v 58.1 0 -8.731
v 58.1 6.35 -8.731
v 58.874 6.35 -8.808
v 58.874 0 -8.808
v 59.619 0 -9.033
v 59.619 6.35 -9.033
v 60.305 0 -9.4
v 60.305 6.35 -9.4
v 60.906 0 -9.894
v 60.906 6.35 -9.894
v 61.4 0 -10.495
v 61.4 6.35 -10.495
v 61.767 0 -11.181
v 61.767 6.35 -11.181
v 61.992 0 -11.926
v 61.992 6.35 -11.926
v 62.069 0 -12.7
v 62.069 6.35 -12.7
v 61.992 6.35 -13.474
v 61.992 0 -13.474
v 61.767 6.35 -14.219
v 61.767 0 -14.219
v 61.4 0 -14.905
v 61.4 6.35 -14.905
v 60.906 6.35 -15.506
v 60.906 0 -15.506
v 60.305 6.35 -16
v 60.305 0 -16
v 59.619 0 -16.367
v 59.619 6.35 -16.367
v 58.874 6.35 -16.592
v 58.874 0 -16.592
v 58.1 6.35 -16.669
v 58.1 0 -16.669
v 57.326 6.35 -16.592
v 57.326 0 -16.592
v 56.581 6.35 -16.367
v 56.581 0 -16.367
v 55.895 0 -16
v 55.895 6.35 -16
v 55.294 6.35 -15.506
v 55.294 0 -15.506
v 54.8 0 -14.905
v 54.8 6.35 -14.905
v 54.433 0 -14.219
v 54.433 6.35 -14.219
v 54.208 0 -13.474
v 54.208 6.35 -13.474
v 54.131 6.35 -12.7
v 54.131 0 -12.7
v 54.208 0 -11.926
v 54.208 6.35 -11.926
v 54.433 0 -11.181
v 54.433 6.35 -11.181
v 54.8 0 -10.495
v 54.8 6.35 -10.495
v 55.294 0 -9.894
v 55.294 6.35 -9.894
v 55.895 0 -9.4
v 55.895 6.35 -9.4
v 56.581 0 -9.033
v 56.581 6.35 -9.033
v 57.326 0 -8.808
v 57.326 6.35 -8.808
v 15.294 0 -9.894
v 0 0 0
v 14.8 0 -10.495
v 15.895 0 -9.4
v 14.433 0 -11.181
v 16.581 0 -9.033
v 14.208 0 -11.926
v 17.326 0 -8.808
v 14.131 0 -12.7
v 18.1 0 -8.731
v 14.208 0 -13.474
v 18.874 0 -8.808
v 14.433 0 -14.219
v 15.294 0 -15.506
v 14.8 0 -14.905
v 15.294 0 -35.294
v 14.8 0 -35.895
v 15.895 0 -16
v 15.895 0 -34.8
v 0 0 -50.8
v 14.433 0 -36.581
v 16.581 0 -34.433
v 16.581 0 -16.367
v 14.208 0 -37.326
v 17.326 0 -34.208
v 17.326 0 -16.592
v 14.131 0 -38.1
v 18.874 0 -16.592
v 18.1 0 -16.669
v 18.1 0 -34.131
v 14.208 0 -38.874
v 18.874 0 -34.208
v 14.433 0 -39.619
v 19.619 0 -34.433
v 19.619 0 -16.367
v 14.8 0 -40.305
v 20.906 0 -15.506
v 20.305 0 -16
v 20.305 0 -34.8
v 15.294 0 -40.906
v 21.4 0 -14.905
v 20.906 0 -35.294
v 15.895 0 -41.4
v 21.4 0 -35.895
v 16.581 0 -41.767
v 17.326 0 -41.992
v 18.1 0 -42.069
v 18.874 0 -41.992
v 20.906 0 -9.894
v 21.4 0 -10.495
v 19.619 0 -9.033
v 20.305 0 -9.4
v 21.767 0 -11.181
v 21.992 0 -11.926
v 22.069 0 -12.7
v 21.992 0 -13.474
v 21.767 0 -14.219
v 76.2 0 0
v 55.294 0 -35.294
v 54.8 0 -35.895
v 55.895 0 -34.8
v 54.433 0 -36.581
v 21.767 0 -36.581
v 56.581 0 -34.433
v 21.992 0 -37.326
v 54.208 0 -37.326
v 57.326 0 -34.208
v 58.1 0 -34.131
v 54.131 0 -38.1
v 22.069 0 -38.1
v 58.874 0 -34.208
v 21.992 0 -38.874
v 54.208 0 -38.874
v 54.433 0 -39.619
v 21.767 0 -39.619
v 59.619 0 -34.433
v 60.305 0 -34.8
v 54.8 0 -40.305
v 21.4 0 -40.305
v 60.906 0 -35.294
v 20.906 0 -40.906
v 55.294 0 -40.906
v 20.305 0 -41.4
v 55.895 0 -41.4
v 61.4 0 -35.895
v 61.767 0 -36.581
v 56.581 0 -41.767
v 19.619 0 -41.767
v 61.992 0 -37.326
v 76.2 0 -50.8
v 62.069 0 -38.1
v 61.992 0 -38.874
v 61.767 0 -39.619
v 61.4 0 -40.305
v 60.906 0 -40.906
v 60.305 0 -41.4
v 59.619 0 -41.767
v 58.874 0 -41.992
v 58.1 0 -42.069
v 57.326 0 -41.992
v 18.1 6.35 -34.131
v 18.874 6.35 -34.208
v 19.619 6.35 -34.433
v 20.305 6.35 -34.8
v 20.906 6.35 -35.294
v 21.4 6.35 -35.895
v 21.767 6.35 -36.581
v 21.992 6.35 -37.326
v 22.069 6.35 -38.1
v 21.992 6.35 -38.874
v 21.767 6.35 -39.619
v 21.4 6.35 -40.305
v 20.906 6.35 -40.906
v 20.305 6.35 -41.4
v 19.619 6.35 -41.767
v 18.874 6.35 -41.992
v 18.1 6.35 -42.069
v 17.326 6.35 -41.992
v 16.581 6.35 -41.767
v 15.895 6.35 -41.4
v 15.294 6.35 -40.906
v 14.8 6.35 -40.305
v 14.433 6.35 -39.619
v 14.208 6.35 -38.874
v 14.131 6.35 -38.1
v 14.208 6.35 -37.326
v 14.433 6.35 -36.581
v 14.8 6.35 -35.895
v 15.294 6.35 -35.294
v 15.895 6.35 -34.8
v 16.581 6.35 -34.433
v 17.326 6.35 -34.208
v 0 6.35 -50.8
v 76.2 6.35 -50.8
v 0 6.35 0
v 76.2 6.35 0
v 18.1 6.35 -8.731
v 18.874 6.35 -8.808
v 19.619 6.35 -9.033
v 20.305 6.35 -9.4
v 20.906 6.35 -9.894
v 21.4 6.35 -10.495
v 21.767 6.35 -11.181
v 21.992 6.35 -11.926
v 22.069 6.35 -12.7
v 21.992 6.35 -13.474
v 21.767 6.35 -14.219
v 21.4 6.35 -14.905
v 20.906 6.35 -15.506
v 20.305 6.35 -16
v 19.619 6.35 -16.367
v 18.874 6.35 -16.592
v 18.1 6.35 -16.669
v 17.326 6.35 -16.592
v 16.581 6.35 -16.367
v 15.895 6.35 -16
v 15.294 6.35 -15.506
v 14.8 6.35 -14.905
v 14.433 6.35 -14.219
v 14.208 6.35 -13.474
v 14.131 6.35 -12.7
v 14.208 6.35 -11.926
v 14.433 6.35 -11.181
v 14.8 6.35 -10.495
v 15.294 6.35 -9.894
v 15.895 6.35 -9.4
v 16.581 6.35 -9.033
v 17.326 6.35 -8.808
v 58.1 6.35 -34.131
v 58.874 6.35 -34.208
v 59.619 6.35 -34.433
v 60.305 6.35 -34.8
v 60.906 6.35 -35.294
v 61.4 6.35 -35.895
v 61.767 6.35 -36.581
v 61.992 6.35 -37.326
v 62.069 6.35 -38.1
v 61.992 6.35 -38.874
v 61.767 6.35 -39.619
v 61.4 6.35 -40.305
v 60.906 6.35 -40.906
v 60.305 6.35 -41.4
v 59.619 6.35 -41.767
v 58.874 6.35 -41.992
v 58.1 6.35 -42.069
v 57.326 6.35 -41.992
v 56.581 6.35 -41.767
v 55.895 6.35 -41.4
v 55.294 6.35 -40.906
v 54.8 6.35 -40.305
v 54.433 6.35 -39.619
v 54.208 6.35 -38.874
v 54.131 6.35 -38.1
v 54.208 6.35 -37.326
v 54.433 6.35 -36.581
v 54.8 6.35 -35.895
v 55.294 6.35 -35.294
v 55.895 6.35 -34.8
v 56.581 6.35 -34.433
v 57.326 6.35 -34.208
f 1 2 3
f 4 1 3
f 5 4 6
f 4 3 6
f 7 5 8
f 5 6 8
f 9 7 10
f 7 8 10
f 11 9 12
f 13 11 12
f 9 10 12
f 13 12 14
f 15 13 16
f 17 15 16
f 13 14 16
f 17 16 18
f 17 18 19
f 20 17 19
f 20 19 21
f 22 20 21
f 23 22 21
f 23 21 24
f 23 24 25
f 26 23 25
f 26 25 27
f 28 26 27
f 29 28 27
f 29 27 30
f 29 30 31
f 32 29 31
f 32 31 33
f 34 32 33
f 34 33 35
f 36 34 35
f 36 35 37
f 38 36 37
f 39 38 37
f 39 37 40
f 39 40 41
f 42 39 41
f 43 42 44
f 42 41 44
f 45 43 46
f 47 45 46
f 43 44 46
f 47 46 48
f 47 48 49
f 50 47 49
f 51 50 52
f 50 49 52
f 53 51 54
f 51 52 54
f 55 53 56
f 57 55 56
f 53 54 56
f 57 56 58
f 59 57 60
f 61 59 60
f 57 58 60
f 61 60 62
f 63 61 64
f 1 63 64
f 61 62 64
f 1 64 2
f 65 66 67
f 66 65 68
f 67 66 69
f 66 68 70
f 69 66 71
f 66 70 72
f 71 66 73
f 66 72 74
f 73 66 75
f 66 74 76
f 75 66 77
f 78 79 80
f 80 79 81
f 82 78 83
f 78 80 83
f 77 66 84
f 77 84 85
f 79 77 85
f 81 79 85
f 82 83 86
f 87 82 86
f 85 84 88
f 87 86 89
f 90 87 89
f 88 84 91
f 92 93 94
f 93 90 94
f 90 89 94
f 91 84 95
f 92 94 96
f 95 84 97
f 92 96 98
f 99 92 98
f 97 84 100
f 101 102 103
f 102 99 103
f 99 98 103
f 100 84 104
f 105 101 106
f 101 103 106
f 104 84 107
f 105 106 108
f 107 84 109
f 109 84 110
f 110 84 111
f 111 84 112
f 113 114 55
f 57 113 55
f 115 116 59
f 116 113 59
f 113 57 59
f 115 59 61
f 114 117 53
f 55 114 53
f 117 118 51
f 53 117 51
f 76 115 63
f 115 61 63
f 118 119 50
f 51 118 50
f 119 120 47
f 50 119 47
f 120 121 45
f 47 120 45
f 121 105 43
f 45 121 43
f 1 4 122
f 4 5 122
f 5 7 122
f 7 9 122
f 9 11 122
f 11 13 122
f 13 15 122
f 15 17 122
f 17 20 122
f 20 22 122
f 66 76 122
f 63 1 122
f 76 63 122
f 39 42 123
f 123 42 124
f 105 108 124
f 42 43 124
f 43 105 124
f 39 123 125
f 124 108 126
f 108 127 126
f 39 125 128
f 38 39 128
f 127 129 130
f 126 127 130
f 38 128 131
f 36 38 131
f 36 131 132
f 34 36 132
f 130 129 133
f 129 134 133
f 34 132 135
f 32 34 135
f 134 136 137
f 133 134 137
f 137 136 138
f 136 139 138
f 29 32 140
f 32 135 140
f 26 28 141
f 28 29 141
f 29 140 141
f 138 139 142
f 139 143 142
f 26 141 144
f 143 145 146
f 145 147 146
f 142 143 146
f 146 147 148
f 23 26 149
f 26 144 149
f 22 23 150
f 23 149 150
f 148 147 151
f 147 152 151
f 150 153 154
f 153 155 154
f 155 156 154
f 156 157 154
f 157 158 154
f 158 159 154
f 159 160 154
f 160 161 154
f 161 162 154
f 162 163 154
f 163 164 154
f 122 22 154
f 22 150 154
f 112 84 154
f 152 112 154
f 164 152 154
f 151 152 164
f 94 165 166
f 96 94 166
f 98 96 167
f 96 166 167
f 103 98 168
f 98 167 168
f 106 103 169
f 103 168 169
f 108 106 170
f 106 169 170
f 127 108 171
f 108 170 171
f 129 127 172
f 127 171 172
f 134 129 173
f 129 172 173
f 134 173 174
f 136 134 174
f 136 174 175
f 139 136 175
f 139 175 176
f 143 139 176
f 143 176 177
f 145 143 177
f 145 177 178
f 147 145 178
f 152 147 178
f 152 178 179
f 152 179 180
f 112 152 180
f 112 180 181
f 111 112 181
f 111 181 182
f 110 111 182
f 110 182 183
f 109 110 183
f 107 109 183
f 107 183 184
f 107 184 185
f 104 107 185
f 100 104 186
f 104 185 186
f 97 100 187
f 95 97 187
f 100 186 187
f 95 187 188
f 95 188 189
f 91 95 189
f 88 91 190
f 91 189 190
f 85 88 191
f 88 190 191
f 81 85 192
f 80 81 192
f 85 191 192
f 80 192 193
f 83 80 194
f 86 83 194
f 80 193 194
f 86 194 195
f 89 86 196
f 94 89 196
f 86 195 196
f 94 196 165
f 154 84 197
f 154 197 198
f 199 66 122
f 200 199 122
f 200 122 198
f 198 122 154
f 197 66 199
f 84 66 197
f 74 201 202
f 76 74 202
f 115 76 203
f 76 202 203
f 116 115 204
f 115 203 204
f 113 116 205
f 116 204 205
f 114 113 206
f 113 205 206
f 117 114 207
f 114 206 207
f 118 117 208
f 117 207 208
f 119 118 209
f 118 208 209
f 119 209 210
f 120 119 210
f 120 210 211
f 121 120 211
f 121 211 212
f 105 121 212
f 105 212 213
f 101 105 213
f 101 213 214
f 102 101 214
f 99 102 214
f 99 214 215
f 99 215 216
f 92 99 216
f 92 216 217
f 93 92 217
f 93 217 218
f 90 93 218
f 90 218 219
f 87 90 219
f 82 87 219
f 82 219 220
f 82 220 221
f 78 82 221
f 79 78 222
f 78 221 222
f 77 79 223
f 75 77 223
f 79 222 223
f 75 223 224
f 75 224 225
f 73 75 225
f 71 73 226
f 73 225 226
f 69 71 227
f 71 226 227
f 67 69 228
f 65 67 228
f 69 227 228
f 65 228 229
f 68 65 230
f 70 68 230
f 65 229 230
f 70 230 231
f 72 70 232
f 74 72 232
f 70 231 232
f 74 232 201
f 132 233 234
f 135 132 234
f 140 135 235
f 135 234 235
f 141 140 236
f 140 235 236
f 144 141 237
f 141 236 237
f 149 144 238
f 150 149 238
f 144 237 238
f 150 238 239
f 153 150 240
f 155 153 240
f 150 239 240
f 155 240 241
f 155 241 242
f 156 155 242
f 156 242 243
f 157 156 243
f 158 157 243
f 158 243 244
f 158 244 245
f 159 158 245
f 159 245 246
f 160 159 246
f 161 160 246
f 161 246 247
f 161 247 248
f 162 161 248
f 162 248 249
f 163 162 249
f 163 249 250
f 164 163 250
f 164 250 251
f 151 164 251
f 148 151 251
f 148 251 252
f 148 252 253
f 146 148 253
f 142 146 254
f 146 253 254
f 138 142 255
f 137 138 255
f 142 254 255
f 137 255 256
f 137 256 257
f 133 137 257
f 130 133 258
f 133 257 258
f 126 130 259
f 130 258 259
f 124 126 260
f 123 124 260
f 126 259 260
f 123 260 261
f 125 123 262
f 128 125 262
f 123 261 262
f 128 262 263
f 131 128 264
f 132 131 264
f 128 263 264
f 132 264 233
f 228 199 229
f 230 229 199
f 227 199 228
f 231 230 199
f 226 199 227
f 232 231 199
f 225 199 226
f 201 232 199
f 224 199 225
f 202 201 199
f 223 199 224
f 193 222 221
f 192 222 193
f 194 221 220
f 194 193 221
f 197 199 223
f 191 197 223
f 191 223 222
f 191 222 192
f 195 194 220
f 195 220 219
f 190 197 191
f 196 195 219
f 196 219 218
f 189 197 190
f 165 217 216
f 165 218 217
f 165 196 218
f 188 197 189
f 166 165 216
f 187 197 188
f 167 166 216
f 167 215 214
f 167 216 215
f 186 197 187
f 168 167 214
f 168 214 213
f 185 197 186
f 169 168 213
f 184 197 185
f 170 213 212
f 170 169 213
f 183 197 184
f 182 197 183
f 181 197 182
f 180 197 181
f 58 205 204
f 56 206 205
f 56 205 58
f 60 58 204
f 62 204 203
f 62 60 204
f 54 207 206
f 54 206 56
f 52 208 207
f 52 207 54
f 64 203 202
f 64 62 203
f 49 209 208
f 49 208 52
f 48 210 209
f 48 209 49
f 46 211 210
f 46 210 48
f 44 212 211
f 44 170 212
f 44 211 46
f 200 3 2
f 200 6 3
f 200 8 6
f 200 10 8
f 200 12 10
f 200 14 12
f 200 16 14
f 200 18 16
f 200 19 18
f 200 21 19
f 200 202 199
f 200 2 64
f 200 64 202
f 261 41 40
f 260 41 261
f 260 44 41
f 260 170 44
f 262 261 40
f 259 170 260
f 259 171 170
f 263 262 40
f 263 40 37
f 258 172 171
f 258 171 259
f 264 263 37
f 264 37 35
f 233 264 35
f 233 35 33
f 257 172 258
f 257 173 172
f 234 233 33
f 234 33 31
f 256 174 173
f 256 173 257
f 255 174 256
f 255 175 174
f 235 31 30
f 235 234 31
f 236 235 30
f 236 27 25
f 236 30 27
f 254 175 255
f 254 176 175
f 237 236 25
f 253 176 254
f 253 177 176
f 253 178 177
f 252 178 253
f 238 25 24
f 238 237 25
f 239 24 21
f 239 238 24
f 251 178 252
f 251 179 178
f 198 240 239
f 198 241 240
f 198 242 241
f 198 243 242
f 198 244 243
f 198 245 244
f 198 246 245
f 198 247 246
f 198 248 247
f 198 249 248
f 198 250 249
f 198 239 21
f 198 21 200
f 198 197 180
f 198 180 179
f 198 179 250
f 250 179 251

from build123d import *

# Parameters (mm, degrees)
SKETCH1_W           = 76.2
SKETCH1_H           = 50.8
BOSS_EXTRUDE1_DEPTH = 6.35
SKETCH3_R           = 3.96875
CUT_EXTRUDE1_DEPTH  = 92.800885072


with BuildPart() as part:
    # Sketch1 → Boss-Extrude1 (new body)
    with BuildSketch(Plane(origin=(0, 0, 0), x_dir=(1, 0, 0), z_dir=(0, 1, 0))):
        with Locations((38.1, 25.4)):
            Rectangle(SKETCH1_W, SKETCH1_H)
    extrude(amount=BOSS_EXTRUDE1_DEPTH)

    # Sketch3 → Cut-Extrude1 (cut, through all)
    with BuildSketch(Plane(origin=(0, 6.35, 0), x_dir=(1, 0, 0), z_dir=(0, 1, 0))):
        with Locations(Location((18.1, 38.1, 0), (0, 0, 270))):
            Circle(SKETCH3_R)
        with Locations(Location((18.1, 12.7, 0), (0, 0, 270))):
            Circle(SKETCH3_R)
        with Locations(Location((58.1, 38.1, 0), (0, 0, 270))):
            Circle(SKETCH3_R)
        with Locations(Location((58.1, 12.7, 0), (0, 0, 270))):
            Circle(SKETCH3_R)
    extrude(amount=-CUT_EXTRUDE1_DEPTH, mode=Mode.SUBTRACT)


solid = part.part
